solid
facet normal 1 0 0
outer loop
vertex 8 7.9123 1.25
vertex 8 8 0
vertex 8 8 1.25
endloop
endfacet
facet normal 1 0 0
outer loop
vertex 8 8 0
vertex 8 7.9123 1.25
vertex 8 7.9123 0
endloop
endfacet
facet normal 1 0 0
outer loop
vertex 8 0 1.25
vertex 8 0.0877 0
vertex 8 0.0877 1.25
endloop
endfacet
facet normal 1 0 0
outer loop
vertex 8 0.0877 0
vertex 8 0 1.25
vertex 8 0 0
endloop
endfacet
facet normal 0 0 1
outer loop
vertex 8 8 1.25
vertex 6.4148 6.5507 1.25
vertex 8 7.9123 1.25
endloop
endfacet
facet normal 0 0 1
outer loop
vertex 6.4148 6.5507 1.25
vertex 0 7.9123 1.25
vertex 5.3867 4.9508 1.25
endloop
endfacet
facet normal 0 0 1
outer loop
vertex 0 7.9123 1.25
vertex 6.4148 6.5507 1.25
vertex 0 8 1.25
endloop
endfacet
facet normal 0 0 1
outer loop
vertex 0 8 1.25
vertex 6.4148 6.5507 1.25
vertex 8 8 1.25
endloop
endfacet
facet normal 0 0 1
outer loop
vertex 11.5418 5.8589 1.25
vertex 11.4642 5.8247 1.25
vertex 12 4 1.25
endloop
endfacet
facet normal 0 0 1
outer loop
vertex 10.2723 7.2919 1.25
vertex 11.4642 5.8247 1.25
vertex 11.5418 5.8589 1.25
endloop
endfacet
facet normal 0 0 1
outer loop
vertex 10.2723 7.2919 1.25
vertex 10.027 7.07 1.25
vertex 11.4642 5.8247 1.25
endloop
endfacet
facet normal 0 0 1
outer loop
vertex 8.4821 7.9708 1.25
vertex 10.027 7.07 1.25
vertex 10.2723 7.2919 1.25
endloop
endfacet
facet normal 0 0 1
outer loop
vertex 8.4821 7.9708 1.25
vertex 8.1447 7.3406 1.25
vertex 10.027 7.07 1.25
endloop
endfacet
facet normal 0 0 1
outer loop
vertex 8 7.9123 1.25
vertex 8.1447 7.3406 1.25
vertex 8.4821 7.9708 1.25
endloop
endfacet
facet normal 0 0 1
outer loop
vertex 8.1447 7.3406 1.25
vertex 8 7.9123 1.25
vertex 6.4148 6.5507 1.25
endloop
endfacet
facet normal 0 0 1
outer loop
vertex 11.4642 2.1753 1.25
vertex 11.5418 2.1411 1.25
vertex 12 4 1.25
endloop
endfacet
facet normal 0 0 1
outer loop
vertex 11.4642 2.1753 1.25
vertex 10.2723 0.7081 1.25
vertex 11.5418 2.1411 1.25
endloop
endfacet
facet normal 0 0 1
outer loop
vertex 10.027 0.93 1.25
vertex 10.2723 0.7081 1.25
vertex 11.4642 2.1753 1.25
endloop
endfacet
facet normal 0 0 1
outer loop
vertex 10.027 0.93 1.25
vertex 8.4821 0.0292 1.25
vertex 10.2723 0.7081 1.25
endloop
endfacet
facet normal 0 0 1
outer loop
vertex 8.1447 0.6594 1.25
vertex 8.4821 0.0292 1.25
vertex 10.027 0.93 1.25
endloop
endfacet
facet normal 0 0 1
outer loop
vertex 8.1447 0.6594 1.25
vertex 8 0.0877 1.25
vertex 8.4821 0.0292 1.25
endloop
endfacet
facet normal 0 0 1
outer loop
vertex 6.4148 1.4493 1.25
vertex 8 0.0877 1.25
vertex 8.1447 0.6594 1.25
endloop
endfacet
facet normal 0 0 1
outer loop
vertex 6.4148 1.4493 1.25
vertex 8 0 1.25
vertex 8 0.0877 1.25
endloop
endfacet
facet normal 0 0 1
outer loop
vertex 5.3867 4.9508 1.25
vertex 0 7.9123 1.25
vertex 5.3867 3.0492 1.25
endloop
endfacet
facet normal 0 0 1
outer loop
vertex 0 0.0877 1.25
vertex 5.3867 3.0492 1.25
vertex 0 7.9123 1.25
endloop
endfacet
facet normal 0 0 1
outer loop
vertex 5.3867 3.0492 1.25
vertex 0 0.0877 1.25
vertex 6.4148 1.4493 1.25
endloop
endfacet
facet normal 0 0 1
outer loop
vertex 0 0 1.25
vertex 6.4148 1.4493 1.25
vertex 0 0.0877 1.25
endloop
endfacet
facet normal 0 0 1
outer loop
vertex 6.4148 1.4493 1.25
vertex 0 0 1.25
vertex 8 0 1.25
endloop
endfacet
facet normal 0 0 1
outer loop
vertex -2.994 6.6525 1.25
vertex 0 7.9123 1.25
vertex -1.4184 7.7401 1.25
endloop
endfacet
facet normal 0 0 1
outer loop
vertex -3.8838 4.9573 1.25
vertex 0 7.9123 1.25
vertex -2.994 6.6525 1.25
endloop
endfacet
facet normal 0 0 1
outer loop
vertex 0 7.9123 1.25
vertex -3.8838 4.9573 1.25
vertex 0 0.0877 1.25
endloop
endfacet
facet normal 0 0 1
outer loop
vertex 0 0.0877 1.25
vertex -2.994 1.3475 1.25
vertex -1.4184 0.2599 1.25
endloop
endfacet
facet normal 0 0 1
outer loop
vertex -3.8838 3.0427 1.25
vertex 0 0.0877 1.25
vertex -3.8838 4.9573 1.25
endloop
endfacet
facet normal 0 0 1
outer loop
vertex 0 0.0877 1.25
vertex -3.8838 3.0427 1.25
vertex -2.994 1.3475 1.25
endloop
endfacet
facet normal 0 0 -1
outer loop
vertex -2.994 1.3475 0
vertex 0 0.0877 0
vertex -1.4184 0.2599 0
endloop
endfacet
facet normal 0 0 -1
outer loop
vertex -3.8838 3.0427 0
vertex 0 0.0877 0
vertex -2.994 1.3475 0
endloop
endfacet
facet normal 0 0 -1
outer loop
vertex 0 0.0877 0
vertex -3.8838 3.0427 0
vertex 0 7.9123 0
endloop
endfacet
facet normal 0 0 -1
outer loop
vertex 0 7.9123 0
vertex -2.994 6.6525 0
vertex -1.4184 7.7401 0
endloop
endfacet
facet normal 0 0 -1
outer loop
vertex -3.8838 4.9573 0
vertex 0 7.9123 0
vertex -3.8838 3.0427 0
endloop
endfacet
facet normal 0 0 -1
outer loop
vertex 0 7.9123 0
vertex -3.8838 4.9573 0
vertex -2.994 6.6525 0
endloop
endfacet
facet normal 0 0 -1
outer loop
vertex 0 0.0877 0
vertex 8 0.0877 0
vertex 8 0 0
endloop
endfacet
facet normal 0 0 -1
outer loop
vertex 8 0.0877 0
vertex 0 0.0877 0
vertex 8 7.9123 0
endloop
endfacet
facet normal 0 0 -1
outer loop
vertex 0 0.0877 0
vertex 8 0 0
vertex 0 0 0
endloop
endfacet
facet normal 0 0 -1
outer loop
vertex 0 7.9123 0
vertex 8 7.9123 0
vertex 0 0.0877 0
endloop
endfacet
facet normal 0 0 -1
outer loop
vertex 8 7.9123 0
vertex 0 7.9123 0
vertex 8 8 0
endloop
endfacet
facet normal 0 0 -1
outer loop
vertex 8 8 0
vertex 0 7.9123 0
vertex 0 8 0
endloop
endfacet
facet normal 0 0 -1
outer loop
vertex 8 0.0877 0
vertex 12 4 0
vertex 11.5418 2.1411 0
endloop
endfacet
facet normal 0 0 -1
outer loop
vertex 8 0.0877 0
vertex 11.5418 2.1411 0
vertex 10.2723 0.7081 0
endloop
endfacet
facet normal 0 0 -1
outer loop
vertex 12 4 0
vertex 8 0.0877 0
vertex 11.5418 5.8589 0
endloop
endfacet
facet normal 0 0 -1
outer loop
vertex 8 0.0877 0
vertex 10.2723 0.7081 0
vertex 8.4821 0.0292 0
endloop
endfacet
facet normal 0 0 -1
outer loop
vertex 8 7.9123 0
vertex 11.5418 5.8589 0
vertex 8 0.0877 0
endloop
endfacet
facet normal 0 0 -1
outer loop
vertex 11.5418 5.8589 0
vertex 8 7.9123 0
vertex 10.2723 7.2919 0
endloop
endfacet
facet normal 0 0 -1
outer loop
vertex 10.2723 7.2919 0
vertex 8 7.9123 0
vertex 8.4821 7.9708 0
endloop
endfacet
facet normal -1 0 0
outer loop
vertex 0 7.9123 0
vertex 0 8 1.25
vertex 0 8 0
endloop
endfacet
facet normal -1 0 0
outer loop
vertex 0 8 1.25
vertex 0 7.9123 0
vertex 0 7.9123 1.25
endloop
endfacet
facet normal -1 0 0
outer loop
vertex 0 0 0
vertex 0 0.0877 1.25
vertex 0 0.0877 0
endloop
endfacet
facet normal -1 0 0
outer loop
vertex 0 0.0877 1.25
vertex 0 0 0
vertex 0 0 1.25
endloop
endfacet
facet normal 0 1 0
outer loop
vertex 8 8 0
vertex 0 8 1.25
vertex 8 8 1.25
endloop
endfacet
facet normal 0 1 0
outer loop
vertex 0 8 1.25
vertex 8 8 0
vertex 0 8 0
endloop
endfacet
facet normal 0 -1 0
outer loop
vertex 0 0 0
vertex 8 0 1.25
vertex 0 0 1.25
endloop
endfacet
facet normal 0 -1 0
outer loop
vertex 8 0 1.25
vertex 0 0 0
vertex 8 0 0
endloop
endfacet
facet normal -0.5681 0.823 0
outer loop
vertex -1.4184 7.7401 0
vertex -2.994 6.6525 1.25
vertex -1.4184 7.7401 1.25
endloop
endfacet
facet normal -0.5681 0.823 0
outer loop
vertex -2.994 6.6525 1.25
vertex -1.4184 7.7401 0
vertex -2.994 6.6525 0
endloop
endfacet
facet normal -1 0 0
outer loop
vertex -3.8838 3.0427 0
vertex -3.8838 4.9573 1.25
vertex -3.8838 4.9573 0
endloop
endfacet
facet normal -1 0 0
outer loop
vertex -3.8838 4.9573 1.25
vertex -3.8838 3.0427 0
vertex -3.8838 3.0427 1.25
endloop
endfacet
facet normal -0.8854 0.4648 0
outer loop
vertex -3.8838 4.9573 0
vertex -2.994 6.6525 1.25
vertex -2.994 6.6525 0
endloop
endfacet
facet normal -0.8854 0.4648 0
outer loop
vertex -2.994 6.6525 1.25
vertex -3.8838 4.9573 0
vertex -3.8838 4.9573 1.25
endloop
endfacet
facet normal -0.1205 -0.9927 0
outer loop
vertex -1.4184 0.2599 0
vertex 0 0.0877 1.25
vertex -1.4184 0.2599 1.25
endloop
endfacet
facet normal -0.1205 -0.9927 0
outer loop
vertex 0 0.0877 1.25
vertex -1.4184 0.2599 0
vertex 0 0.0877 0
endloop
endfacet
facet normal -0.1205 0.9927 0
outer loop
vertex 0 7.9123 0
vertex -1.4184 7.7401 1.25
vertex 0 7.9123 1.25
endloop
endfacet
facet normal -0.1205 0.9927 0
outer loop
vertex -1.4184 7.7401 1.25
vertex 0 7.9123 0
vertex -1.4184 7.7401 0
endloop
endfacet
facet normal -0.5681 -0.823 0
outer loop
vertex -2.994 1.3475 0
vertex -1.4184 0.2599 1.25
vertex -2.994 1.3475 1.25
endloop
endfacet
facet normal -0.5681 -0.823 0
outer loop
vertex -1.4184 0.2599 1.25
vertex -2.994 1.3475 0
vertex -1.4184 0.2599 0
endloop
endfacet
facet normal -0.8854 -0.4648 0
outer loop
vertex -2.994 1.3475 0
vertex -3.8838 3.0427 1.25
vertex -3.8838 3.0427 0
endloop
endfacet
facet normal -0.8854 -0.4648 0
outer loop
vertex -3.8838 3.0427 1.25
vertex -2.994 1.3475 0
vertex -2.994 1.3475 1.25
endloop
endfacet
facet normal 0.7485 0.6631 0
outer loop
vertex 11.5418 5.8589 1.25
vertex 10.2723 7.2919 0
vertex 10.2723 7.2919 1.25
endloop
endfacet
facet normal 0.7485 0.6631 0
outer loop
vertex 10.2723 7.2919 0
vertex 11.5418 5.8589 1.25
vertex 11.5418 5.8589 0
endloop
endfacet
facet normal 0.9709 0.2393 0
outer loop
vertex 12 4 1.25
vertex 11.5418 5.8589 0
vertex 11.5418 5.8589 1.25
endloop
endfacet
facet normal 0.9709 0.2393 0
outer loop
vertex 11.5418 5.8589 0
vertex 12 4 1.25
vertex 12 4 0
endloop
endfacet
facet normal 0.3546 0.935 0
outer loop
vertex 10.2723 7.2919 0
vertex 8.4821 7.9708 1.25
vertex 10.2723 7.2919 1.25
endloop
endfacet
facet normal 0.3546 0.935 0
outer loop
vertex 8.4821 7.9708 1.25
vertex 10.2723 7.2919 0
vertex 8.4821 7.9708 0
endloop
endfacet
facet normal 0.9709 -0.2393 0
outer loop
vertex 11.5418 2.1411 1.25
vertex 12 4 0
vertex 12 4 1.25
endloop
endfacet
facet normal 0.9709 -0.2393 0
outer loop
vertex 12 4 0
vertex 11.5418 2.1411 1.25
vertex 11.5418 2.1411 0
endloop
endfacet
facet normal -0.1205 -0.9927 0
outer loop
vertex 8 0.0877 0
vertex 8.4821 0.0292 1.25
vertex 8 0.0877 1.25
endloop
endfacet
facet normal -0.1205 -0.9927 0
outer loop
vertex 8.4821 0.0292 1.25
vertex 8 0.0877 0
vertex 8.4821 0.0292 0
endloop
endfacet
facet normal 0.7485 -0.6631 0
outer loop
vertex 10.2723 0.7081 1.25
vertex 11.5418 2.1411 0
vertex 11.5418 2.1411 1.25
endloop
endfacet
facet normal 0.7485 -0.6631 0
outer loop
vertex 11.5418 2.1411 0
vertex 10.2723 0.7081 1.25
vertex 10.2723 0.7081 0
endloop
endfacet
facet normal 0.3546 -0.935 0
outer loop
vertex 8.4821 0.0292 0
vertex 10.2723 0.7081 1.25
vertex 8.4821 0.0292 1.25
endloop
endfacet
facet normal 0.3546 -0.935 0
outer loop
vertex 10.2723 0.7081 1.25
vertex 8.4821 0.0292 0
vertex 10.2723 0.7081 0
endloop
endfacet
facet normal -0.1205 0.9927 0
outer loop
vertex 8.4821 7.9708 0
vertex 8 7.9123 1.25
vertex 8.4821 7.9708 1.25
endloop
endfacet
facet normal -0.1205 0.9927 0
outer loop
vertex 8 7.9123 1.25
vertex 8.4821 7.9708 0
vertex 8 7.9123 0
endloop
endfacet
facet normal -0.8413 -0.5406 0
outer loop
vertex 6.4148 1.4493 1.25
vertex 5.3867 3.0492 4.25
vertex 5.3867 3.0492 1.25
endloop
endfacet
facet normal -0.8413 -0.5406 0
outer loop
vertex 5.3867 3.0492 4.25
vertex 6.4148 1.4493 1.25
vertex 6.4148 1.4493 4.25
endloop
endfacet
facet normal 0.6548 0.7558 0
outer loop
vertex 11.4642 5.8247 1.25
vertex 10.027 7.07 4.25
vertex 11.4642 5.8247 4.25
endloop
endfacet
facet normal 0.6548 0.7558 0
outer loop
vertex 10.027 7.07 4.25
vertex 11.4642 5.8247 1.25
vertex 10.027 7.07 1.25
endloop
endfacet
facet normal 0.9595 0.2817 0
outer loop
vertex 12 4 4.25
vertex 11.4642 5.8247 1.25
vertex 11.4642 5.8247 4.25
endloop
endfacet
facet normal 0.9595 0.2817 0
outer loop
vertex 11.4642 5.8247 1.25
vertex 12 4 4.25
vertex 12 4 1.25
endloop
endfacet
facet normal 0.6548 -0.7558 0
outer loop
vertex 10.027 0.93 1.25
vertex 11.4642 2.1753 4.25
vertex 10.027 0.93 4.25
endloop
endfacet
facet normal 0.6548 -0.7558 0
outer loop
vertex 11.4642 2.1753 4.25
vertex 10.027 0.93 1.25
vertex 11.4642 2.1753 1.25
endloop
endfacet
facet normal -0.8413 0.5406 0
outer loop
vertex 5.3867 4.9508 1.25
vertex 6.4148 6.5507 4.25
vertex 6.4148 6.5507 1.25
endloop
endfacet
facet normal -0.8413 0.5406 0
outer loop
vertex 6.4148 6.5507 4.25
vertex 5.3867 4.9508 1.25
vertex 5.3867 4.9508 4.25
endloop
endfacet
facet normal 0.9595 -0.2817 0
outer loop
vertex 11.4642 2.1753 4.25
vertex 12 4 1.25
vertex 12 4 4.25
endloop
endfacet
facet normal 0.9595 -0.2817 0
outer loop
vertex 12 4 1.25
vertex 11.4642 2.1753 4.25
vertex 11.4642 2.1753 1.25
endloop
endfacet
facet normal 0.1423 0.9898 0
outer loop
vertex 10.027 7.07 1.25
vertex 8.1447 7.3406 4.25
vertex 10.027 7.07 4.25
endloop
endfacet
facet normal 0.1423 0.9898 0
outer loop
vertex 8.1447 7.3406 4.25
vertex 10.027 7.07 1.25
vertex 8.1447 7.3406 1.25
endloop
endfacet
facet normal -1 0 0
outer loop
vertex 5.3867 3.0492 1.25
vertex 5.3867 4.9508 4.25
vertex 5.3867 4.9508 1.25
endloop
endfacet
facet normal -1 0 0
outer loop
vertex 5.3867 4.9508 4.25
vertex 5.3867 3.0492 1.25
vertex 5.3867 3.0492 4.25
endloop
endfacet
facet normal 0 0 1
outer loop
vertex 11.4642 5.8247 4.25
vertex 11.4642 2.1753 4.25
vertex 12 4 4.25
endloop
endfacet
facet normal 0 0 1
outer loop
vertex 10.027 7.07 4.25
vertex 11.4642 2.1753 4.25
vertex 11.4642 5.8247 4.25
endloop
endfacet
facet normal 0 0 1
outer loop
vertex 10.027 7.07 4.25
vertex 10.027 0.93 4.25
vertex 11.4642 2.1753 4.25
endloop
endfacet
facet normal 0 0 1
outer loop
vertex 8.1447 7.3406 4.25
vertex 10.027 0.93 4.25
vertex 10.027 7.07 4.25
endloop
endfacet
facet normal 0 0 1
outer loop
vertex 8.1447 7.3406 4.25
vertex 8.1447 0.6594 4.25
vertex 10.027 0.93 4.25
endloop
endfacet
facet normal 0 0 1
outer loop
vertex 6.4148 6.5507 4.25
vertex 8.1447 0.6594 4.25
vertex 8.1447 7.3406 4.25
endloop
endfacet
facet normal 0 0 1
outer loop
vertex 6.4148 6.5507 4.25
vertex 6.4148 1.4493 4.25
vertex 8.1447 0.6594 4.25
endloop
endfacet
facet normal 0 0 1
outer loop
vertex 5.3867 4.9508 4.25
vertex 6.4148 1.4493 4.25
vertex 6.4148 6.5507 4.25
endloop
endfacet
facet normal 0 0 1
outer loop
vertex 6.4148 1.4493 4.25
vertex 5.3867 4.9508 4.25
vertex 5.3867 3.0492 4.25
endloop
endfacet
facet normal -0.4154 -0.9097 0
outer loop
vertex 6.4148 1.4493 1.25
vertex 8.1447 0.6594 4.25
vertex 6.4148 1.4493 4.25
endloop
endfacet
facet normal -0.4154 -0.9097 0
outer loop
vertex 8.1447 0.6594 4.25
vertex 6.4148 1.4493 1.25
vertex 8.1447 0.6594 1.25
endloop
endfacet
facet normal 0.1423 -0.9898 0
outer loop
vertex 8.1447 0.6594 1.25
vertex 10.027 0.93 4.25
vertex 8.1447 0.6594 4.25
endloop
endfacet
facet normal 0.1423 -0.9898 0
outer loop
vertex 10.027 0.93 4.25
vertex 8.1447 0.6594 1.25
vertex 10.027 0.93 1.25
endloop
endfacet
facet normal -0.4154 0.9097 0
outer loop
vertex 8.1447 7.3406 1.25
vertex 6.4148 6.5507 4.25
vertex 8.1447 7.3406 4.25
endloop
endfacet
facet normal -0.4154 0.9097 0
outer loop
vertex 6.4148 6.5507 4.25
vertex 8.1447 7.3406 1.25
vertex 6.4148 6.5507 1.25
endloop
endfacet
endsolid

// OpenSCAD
//Slider Base Dimensions
Width = 8;
Length = 16;
Thickness = 1.25;

//////Peg Dimensions//////
Diameter = 6.75; //Increse if slider is too loose, decrease if too snug
Height = 3;

module slider_base(x,y){  //Cutout slot, (x,y) = position
translate([0,0,0]){
union(){
cube([Length-Width,Width,Thickness]);
translate([0,Width/2,0]){
    cylinder(r=Width/2,h=Thickness);
}
translate([Length-Width,Width/2,0]){
    cylinder(r=Width/2,h=Thickness);
}
}
}
}
module peg(x,y,z){
translate([x,y,z]){
    cylinder(r=Diameter/2,h=Height);
}
}
union(){
slider_base();
peg(Length-Width/2-Diameter/2,Width/2,Thickness);
}
